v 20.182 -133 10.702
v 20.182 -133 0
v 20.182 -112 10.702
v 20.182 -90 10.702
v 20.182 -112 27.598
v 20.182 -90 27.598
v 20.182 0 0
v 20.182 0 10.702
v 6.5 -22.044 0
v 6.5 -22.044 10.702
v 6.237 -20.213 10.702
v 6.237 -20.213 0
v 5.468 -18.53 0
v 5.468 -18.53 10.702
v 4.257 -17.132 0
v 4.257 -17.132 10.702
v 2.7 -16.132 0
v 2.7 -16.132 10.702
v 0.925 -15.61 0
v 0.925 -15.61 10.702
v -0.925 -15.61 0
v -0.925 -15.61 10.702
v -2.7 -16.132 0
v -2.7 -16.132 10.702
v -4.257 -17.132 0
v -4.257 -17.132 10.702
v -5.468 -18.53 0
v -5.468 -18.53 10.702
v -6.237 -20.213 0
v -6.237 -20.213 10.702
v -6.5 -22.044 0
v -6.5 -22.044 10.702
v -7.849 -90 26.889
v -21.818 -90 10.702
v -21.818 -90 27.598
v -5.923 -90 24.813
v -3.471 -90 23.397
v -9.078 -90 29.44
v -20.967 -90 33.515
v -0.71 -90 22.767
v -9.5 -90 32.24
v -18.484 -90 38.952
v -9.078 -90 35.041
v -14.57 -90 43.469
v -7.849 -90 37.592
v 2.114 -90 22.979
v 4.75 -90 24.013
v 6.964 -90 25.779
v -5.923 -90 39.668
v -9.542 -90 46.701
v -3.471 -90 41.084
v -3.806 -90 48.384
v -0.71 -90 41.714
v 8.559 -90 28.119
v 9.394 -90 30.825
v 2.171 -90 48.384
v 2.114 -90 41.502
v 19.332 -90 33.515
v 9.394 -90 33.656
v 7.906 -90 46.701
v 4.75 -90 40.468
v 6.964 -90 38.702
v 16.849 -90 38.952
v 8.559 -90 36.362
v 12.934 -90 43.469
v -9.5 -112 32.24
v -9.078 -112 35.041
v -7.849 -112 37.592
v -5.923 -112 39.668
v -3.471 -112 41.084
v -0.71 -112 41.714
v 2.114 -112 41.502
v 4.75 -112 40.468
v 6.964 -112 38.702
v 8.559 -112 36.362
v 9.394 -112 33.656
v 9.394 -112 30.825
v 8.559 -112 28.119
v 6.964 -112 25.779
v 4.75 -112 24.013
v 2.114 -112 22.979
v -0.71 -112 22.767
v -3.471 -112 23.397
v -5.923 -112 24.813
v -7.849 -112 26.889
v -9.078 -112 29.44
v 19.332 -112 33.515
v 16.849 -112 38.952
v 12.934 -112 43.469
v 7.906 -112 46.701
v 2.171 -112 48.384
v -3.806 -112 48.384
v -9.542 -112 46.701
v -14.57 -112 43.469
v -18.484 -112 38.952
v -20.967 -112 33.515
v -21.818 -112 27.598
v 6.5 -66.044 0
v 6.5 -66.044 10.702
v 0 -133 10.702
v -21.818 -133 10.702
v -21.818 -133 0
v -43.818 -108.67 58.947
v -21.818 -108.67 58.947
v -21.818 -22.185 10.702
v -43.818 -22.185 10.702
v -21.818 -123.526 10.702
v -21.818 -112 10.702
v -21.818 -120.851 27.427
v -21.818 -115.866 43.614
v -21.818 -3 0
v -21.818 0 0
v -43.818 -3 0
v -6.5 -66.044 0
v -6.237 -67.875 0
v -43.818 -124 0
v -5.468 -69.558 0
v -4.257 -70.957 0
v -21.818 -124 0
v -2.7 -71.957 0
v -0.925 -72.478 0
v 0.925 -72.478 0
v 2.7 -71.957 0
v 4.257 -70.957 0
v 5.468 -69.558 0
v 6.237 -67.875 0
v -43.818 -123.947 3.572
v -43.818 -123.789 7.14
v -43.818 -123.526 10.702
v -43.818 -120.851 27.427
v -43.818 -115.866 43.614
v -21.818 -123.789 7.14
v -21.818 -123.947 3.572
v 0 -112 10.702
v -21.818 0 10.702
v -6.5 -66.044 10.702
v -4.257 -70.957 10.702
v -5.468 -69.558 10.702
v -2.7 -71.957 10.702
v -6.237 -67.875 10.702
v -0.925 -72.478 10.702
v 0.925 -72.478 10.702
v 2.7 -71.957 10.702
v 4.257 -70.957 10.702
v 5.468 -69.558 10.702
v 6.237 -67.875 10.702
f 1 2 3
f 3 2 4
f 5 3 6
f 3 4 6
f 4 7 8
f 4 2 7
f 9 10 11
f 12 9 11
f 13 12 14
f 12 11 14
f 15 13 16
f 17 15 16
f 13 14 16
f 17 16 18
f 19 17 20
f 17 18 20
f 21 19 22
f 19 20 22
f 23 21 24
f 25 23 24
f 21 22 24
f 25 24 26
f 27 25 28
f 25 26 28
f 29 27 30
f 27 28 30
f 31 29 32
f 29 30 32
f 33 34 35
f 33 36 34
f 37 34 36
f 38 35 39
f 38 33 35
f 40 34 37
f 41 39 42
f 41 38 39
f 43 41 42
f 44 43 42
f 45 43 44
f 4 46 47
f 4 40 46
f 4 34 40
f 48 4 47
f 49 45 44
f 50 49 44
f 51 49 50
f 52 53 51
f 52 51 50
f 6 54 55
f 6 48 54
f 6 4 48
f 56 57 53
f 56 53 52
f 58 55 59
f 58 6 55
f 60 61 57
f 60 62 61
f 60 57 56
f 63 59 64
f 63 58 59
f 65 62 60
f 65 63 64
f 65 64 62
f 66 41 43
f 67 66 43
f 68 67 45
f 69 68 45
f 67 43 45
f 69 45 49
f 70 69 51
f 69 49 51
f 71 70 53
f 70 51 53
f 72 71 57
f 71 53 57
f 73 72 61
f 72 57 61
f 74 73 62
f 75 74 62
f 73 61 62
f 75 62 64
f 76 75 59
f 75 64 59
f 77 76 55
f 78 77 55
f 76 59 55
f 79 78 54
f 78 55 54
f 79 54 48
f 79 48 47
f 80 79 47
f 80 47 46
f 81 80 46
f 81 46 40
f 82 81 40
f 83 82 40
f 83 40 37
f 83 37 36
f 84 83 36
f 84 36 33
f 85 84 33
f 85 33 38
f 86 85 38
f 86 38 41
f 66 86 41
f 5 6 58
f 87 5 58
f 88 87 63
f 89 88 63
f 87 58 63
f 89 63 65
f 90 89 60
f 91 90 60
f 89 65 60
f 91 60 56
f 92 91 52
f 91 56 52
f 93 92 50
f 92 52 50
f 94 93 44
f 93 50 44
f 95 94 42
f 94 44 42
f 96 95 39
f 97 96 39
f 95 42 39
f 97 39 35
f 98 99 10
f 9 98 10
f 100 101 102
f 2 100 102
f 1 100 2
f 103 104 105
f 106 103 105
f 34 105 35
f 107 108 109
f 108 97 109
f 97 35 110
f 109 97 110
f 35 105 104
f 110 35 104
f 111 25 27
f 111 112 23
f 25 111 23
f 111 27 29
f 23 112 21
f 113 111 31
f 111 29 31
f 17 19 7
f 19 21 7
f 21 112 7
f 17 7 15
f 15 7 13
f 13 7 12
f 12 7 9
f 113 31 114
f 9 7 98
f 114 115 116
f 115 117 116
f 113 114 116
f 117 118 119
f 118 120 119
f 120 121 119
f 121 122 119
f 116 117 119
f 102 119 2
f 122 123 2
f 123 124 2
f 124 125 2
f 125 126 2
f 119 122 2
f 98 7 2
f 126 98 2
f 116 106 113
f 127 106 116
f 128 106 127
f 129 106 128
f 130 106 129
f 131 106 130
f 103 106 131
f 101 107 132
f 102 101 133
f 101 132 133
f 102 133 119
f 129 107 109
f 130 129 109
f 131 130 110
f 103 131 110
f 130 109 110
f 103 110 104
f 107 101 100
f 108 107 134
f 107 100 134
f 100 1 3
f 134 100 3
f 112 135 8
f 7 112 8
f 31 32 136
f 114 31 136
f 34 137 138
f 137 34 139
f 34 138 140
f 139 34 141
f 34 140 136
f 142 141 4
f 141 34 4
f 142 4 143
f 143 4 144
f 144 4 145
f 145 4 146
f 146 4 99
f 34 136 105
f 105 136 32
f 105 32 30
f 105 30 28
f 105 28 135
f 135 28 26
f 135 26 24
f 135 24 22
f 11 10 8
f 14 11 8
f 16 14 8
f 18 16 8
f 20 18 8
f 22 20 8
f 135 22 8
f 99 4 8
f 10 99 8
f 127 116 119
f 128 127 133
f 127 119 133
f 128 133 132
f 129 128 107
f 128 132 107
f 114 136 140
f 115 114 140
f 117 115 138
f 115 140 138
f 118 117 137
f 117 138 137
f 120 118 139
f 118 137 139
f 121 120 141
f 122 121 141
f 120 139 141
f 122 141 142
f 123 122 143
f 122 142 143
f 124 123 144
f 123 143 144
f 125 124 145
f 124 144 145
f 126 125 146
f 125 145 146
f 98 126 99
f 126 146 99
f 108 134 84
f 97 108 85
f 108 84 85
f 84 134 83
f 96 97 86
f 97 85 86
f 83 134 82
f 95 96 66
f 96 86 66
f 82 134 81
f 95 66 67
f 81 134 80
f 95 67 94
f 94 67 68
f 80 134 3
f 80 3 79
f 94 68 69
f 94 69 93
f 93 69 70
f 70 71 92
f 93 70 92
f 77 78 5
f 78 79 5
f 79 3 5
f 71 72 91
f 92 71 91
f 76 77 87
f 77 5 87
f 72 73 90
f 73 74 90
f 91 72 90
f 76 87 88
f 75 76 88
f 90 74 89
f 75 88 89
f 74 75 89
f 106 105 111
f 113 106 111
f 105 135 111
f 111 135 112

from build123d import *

# Parameters (mm, degrees)
F0_W          = 42
F0_H          = 16
F1_DEPTH      = 133
F2_W          = 21
F2_H          = 52.7929635726
F3_DEPTH      = 20.1831926579
F4_W          = 21
F4_H          = 40.5876869309
F5_DEPTH      = 25
F6_W          = 90
F6_H          = 45.8940723884
F7_DEPTH      = 20.1831926579
F7_DEPTH_BACK = 25
F11_DEPTH     = 22
F13_DEPTH     = 25
F12_R         = 9.5
F14_DEPTH     = 25


with BuildPart() as f1:
    # F0 (on Front) → F1 (new body)
    with BuildSketch(Plane.XZ):
        with Locations((-0.8178073421, 8)):
            Rectangle(F0_W, F0_H)
        with BuildLine():
            Line((-21.8178073421, 27.5982314394), (-21.8178073421, 16))
            Line((-21.8178073421, 16), (20.1821926579, 16))
            Line((20.1821926579, 16), (20.1821926579, 27.5982314394))
            ThreePointArc((20.1821926579, 27.5982314394), (-0.8178073421, 48.5982314394), (-21.8178073421, 27.5982314394))
        make_face()
    extrude(amount=F1_DEPTH)

    # F2 (on Right) → F3 (cut, through all)
    with BuildSketch(Plane.YZ):
        with Locations((-122.5, 37.0988822573)):
            Rectangle(F2_W, F2_H)
    extrude(amount=F3_DEPTH, mode=Mode.SUBTRACT)

    # F4 (on face) → F5 (cut)
    with BuildSketch(Plane.YZ):
        with Locations((-122.5, 30.9962439364)):
            Rectangle(F4_W, F4_H)
    extrude(amount=-F5_DEPTH, mode=Mode.SUBTRACT)

    # F6 (on Right) → F7 (cut, two sides)
    with BuildSketch(Plane.YZ) as f7_sk:
        with Locations((-45, 33.6494366652)):
            Rectangle(F6_W, F6_H)
    extrude(amount=F7_DEPTH, mode=Mode.SUBTRACT)
    extrude(f7_sk.sketch, amount=-F7_DEPTH_BACK, mode=Mode.SUBTRACT)

    # F10 (on face) → F11 (join)
    with BuildSketch(Plane(origin=(-21.8178073421, 0, 0), x_dir=(0, -1, 0), z_dir=(-1, 0, 0))):
        with BuildLine():
            ThreePointArc((123.5257591727, 10.702400471), (118.6419482908, 35.6081422643), (108.6703372937, 58.9472630089))
            Line((108.6703372937, 58.9472630089), (22.1853906338, 10.702400471))
            Line((22.1853906338, 10.702400471), (90, 10.702400471))
            Line((90, 10.702400471), (90, 27.5982314394))
            Line((90, 27.5982314394), (112, 27.5982314394))
            Line((112, 27.5982314394), (112, 10.702400471))
            Line((112, 10.702400471), (123.5257591727, 10.702400471))
        make_face()
        with BuildLine():
            ThreePointArc((124, 0), (123.8813816514, 5.3564512553), (123.5257591727, 10.702400471))
            Line((123.5257591727, 10.702400471), (112, 10.702400471))
            Line((112, 10.702400471), (112, 27.5982314394))
            Line((112, 27.5982314394), (90, 27.5982314394))
            Line((90, 27.5982314394), (90, 10.702400471))
            Line((90, 10.702400471), (22.1853906338, 10.702400471))
            Line((22.1853906338, 10.702400471), (3, 0))
            Line((3, 0), (124, 0))
        make_face()
    extrude(amount=F11_DEPTH)

    # F8 (on face) → F13 (cut)
    with BuildSketch(Plane.XY.offset(10.702400471)):
        with BuildLine():
            ThreePointArc((6.5, -22.0442066215), (0, -15.5442066215), (-6.5, -22.0442066215))
            Line((-6.5, -22.0442066215), (-6.5, -66.0442066215))
            ThreePointArc((-6.5, -66.0442066215), (0, -72.5442066215), (6.5, -66.0442066215))
            Line((6.5, -66.0442066215), (6.5, -22.0442066215))
        make_face()
    extrude(amount=-F13_DEPTH, mode=Mode.SUBTRACT)

    # F12 (on face) → F14 (cut)
    with BuildSketch(Plane(origin=(0, -90, 0), x_dir=(-1, 0, 0), z_dir=(0, 1, 0))):
        with Locations((0, 32.2404283148)):
            Circle(F12_R)
    extrude(amount=-F14_DEPTH, mode=Mode.SUBTRACT)


solid = f1.part
